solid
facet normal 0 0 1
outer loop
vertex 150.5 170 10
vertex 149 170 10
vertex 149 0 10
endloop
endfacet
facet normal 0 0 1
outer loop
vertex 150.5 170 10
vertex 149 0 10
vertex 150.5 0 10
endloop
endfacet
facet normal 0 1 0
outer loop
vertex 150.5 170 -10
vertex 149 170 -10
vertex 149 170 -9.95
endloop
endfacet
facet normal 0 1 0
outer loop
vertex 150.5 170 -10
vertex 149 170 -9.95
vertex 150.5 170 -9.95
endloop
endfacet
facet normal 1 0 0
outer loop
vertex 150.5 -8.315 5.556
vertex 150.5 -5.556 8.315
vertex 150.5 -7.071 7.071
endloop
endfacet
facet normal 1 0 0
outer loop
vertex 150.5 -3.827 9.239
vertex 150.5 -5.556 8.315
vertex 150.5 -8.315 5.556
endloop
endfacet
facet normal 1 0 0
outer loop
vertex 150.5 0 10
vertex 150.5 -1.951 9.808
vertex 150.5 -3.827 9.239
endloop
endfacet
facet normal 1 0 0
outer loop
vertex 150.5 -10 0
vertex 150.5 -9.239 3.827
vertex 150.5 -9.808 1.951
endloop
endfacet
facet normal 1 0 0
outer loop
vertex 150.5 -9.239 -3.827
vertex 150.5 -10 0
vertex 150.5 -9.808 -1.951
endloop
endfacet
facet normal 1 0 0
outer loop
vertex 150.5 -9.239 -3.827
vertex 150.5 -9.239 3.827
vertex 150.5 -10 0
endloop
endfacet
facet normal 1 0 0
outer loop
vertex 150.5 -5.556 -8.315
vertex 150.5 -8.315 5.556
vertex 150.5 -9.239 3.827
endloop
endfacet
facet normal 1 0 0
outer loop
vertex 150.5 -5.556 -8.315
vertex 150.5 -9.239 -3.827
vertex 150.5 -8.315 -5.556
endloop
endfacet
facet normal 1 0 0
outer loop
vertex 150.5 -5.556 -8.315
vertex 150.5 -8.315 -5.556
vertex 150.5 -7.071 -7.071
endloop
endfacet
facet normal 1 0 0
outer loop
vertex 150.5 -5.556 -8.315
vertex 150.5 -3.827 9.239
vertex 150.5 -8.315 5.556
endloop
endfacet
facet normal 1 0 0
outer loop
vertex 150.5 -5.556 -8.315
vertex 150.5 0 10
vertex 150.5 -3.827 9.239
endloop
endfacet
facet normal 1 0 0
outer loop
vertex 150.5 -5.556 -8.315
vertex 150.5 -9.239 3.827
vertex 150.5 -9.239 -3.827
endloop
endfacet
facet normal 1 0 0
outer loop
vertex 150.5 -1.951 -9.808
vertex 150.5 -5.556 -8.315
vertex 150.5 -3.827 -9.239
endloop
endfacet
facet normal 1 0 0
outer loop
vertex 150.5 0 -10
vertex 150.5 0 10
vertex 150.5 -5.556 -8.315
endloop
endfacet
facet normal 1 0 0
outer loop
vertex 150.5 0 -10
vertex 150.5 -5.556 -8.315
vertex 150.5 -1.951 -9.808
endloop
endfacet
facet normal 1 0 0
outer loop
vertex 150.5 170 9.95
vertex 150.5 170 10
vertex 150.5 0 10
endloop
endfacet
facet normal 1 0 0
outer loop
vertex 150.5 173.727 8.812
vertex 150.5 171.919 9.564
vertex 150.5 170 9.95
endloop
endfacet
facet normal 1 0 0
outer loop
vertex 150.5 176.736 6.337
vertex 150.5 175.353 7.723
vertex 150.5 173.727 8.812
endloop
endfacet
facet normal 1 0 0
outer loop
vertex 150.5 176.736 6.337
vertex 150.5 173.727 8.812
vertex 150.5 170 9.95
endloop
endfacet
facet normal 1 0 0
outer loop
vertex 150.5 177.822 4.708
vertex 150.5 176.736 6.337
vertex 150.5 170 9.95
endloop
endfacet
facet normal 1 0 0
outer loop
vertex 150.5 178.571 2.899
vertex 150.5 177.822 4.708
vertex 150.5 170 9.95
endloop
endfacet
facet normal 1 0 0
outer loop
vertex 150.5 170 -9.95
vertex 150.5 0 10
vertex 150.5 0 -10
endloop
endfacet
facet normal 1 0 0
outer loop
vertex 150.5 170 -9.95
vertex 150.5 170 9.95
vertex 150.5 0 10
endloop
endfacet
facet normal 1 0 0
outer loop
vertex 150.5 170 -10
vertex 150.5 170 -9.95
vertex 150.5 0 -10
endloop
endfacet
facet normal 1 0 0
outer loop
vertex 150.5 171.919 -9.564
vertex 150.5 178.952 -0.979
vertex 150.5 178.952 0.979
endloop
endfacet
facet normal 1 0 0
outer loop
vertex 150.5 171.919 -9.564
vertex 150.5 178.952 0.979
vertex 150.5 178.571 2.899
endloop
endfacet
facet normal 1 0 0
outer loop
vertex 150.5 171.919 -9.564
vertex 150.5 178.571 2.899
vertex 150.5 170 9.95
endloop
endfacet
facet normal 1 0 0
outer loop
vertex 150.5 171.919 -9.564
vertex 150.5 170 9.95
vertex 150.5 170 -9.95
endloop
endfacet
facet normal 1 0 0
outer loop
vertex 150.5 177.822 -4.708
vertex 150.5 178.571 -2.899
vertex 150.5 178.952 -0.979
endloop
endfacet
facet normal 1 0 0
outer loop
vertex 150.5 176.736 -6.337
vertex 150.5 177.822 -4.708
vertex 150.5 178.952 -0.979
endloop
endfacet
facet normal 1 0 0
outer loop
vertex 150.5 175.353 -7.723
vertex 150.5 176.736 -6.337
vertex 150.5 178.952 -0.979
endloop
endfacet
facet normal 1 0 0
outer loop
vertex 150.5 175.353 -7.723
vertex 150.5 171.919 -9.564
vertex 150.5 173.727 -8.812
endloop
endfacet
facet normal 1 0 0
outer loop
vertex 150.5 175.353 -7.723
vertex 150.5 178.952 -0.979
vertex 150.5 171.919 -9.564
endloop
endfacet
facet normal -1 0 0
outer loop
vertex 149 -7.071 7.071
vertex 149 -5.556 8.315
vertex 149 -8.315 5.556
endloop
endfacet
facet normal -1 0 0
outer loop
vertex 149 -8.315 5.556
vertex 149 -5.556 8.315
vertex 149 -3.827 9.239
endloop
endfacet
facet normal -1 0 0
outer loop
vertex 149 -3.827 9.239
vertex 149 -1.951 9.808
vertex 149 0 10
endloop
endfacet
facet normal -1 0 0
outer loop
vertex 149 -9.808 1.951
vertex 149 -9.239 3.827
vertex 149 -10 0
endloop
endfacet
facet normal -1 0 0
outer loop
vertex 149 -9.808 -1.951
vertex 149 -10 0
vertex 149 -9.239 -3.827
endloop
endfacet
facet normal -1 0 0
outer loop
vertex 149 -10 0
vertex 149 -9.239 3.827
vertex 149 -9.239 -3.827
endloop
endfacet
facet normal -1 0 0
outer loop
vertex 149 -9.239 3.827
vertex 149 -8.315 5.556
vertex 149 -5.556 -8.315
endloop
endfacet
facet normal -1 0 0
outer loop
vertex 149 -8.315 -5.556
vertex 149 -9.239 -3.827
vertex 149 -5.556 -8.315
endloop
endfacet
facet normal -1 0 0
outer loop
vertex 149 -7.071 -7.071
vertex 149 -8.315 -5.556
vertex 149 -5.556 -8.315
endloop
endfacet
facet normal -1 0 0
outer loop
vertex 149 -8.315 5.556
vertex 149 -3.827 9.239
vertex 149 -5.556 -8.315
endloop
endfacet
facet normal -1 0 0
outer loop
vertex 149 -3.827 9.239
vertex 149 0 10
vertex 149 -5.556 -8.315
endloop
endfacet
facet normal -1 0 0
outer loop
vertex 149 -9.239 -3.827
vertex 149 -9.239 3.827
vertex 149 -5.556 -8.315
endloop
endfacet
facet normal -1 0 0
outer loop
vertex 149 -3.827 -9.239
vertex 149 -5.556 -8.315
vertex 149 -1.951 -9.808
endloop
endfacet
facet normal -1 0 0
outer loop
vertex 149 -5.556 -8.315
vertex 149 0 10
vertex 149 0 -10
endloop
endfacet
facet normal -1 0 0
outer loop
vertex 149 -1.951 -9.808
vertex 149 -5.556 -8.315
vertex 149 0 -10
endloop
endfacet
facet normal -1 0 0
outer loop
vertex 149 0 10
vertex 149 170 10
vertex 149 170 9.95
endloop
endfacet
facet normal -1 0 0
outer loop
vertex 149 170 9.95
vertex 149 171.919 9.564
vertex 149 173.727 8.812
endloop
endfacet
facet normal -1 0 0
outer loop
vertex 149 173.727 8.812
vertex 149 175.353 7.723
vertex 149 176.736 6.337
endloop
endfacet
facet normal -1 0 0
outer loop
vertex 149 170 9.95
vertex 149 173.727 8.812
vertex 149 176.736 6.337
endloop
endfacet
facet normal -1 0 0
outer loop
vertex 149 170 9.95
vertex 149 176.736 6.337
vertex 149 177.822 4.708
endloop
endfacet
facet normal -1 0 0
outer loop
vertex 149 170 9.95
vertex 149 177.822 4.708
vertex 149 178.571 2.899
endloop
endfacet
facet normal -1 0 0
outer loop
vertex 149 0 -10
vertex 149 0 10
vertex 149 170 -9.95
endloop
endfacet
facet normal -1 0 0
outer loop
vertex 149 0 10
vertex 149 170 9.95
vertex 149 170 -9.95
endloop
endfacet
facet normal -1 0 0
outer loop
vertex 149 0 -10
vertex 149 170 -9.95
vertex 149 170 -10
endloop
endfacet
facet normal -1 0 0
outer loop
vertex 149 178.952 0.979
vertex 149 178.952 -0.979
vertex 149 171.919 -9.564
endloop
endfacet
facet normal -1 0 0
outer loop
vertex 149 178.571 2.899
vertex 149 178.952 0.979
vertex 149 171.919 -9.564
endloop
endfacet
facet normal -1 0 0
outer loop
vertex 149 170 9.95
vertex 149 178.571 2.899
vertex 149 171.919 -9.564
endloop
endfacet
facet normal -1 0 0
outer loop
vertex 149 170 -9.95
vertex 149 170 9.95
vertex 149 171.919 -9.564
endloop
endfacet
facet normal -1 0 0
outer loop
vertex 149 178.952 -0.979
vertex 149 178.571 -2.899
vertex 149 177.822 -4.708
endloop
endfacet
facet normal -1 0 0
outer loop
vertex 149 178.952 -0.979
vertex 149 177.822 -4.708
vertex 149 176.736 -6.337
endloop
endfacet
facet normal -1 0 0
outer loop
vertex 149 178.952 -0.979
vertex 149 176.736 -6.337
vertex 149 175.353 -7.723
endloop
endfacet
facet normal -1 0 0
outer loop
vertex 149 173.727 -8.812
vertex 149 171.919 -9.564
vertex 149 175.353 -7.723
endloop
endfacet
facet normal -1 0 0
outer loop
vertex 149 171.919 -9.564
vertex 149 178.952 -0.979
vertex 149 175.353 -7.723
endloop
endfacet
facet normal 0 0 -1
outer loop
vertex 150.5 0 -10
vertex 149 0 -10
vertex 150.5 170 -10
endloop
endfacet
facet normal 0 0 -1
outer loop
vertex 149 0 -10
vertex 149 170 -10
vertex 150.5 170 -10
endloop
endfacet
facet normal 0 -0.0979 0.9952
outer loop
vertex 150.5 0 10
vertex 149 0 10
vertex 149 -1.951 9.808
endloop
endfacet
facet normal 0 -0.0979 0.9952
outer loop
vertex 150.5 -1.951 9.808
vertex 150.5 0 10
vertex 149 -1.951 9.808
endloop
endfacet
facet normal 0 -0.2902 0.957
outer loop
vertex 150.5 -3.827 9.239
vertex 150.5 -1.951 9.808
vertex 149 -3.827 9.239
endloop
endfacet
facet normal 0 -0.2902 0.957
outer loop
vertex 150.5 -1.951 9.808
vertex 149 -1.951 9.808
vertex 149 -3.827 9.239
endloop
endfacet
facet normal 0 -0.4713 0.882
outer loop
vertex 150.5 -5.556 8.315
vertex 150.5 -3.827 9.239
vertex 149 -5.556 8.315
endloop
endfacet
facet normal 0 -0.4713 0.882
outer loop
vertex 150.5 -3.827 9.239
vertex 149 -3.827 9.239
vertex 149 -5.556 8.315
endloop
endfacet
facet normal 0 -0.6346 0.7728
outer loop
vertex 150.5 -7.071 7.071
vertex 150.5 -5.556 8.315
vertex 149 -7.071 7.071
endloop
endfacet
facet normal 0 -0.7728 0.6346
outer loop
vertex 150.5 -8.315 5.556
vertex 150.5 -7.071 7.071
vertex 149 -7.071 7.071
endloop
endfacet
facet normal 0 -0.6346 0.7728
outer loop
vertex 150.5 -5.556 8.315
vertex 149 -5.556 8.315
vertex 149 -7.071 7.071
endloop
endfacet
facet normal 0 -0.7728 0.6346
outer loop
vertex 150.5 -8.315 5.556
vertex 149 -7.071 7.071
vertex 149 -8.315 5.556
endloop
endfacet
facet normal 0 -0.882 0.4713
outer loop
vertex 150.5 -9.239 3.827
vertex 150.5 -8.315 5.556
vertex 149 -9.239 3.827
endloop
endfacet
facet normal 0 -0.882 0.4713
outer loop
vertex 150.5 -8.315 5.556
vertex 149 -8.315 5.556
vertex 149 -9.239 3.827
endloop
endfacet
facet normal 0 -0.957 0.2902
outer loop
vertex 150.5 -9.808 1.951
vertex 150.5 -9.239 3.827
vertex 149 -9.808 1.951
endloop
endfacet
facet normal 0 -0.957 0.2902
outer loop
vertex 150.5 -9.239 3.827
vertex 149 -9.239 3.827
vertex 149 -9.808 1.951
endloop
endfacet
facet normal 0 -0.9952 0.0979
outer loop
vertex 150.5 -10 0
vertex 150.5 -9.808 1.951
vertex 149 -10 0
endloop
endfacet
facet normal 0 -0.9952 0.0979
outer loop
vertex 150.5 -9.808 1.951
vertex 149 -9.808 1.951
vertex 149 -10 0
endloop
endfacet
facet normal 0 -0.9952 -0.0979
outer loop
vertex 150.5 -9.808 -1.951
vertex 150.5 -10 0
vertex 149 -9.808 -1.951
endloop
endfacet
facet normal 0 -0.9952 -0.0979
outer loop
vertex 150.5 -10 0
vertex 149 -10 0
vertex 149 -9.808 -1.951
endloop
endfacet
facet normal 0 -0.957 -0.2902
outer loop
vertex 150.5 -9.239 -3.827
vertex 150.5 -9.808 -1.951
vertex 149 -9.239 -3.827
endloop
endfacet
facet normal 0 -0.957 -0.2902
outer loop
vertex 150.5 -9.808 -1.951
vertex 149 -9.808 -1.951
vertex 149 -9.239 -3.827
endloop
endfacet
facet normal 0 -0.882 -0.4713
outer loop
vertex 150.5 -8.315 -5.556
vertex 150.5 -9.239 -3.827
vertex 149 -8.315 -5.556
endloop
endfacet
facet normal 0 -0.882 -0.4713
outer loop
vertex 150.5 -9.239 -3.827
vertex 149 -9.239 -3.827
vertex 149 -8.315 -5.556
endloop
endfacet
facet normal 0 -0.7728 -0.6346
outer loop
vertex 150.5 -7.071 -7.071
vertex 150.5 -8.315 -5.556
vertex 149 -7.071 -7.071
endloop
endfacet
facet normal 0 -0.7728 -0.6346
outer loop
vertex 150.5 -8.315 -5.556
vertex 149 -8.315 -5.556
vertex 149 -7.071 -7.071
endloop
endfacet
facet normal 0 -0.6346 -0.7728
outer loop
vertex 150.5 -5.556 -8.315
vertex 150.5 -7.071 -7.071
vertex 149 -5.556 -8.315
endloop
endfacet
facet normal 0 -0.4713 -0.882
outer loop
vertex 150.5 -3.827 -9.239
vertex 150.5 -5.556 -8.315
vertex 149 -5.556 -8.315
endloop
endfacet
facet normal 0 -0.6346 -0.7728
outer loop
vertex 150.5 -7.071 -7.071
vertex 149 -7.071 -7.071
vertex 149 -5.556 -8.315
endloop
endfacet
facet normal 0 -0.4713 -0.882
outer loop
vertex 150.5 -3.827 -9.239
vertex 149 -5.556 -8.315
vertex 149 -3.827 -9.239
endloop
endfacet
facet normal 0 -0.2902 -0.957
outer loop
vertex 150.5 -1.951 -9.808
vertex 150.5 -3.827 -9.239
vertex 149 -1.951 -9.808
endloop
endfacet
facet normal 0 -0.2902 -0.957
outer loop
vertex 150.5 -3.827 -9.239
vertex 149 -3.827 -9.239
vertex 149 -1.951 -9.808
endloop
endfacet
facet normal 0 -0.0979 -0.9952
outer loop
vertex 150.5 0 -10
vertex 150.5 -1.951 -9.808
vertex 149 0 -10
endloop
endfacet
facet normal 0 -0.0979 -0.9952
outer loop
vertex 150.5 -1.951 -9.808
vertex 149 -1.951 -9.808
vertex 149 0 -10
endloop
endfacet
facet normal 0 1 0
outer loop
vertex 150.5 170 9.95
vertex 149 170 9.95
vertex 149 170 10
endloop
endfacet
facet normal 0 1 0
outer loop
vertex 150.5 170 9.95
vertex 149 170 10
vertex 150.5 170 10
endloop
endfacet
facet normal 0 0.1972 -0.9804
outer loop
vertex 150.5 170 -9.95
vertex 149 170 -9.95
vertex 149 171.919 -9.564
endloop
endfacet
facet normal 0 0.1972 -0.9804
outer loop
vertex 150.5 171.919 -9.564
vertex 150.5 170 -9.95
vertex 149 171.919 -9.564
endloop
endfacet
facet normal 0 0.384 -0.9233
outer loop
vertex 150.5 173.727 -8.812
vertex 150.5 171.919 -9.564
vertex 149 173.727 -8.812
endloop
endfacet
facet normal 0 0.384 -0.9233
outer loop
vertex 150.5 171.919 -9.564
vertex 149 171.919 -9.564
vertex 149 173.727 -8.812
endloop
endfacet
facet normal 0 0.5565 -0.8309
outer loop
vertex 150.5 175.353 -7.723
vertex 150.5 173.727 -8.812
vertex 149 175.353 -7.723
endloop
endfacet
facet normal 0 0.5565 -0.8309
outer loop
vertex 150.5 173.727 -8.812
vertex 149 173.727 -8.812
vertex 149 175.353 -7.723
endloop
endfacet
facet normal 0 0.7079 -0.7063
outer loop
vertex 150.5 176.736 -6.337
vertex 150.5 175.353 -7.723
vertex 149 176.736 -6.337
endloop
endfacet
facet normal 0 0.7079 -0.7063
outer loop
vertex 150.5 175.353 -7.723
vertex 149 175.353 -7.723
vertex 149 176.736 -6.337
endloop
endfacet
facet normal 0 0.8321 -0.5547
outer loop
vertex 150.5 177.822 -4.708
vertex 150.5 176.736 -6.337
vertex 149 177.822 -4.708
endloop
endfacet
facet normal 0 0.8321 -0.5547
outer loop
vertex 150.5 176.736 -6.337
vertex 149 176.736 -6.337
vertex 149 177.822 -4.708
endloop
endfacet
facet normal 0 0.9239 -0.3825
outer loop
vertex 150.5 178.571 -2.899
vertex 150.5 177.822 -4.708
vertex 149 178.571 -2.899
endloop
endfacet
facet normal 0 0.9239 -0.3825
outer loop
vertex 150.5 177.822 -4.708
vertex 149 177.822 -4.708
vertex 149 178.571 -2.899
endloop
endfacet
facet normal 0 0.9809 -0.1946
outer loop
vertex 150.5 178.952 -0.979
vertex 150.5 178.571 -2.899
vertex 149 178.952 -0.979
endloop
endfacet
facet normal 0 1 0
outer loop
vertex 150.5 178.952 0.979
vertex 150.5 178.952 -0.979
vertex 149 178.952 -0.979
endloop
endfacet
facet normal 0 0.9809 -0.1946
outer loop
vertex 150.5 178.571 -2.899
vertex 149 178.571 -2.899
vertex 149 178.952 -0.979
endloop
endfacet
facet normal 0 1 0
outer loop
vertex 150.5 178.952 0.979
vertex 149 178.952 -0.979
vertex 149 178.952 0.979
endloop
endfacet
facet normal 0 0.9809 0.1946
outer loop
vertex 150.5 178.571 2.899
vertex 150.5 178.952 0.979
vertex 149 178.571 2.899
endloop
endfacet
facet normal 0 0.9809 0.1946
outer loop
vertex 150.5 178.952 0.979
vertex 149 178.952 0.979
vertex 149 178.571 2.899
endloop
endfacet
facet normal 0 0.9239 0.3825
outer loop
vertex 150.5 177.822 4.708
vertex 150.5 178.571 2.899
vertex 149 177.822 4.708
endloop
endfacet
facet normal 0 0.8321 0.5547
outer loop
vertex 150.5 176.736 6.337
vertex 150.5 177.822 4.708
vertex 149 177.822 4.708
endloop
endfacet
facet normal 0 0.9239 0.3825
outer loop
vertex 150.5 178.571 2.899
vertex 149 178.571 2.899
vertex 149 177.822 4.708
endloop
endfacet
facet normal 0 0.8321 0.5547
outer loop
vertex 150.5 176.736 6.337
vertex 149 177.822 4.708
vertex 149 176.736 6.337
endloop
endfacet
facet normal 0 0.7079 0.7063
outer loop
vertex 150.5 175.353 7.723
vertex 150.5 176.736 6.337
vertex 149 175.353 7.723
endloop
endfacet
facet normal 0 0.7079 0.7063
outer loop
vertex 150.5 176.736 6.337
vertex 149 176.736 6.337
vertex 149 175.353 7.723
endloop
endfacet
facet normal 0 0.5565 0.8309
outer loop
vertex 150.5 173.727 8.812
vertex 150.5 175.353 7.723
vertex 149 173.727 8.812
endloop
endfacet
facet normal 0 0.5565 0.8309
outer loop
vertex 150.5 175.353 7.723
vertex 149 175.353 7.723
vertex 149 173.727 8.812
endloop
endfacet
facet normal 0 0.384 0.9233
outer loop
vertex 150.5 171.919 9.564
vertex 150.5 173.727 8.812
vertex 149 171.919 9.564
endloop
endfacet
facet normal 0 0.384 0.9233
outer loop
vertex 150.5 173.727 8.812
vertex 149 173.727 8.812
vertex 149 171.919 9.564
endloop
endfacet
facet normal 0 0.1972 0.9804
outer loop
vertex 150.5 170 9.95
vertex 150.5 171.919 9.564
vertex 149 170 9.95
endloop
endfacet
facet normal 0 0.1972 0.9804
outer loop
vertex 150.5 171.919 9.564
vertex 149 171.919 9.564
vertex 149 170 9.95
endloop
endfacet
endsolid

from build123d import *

# Parameters (mm, degrees)
CYLINDER001_R     = 10
CYLINDER001_DEPTH = 1.5
BOX001_W          = 1.5
BOX001_H          = 170
BOX001_DEPTH      = 20
CYLINDER_R        = 10
CYLINDER_DEPTH    = 1.5


with BuildPart() as cylinder001:
    # Cylinder001 → Cylinder001 (new body)
    with BuildSketch(Plane(origin=(0, 169, 0), x_dir=(0, 0, -1), z_dir=(1, 0, 0))):
        Circle(CYLINDER001_R)
    extrude(amount=CYLINDER001_DEPTH)


with BuildPart() as cube001:
    # Box001 → Box001 (new body)
    with BuildSketch(Plane.XY.offset(-10)):
        with Locations((0.75, 85)):
            Rectangle(BOX001_W, BOX001_H)
    extrude(amount=BOX001_DEPTH)


with BuildPart() as front:
    # Cylinder → Cylinder (new body)
    with BuildSketch(Plane(origin=(0, 0, 0), x_dir=(0, 0, -1), z_dir=(1, 0, 0))):
        Circle(CYLINDER_R)
    extrude(amount=CYLINDER_DEPTH)

    # Fusion: union Cylinder001, Cube001
    add(cylinder001.part)
    add(cube001.part)


with BuildPart() as front_1:
    # Fusion placement: moved
    add(front.part.moved(Location((149, 0, 0))))


solid = front_1.part
